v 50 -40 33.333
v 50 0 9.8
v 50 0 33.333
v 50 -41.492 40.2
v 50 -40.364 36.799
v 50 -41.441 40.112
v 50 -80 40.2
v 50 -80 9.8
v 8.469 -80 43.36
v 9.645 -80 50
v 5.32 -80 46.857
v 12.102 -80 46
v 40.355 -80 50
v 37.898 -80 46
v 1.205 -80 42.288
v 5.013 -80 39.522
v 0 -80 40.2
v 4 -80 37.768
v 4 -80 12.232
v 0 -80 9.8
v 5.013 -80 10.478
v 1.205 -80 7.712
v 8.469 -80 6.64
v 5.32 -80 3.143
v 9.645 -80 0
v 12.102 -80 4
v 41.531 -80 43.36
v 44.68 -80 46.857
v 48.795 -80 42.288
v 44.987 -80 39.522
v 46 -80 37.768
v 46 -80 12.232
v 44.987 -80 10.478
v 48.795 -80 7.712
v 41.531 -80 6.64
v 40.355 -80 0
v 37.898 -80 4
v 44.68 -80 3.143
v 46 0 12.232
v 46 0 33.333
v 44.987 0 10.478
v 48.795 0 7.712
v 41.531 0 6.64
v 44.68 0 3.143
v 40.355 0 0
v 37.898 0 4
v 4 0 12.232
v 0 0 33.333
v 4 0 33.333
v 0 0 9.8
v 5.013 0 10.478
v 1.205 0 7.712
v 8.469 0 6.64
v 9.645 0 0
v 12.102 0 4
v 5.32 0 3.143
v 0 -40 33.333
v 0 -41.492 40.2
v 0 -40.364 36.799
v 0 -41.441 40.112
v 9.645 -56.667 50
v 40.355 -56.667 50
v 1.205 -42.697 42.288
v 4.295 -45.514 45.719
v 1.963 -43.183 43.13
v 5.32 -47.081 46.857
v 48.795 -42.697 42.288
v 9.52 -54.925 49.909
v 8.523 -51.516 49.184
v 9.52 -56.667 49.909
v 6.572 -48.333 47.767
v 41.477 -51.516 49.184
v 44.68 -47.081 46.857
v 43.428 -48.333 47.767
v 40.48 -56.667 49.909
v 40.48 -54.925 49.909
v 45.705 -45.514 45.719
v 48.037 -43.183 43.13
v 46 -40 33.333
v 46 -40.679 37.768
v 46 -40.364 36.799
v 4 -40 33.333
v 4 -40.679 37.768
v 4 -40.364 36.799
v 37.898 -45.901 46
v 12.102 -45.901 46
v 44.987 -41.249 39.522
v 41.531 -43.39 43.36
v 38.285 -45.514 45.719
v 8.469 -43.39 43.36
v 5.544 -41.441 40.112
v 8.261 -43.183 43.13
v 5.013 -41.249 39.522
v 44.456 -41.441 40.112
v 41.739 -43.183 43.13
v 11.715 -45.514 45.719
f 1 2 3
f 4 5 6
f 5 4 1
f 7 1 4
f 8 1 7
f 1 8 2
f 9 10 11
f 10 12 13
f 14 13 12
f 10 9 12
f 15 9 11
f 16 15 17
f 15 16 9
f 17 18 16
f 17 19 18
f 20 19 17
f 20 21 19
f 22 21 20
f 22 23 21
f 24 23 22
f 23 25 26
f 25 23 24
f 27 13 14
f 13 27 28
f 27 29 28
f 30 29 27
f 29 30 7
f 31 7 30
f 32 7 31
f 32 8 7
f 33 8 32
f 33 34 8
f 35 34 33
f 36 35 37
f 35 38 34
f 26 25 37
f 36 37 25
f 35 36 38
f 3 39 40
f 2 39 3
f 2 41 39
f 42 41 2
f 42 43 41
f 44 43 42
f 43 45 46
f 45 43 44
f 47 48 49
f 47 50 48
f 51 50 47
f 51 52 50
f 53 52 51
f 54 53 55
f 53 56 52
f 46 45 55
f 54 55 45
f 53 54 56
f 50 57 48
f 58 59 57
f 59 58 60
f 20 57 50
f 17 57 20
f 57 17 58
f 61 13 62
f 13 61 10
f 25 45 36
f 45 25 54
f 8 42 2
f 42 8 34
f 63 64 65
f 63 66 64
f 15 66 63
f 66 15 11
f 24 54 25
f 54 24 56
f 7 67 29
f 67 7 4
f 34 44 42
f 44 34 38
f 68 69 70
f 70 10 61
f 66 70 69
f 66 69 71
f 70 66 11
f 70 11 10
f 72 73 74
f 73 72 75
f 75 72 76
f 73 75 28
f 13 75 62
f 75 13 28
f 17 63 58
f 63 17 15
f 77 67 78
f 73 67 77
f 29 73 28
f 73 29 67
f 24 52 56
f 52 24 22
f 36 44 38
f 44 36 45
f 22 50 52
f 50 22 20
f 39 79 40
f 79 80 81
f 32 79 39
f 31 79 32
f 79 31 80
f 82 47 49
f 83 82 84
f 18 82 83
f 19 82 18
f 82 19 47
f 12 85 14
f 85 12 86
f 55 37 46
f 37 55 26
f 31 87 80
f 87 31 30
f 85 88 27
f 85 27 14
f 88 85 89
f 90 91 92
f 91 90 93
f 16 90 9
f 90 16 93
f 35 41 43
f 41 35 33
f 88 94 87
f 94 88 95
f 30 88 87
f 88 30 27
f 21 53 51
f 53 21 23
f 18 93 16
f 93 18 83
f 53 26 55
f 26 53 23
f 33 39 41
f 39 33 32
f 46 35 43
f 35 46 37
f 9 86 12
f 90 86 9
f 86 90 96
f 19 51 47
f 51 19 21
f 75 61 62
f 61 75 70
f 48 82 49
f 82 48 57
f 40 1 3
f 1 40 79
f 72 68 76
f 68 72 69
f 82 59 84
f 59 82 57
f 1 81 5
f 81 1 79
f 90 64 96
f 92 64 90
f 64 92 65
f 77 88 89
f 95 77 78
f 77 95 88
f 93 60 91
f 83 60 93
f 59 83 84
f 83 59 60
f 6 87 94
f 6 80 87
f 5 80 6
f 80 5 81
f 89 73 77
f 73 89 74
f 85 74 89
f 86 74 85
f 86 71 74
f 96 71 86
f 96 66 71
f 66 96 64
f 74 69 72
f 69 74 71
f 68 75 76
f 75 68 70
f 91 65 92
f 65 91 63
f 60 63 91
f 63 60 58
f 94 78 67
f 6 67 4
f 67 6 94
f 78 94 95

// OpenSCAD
//
//  Copyright (C) 05-11-2012 Jasper den Ouden.
//
//  This is free software: you can redistribute it and/or modify
//  it under the terms of the GNU General Public License as published
//  by the Free Software Foundation, either version 3 of the License, or
//  (at your option) any later version.
//

module meh(r,w,h)
{ intersection()
    {
        cube([w,w,h]);
        translate([w/2,w/2]) cylinder(r=r,h=h);
    }
}

w = 50;
Rf = 1.7;
R = w/Rf;
h = 80;

plate_w = 4;

drop = w/3;
hinge_y = h/2;

module body()
{ wi = w-2*plate_w;
  Ri = wi/Rf;
  difference()
  { meh(R,w,h);
    translate([plate_w,plate_w,-h]) meh(Ri,wi,3*h);
    /*  translate([plate_w,plate_w,-h]) intersection()
      { meh(Ri,wi,3*h);
          union()
          { cube([w,w,h+hinge_y]);
            cube([w,w-drop,3*h]);
//            translate([0,w-drop-plate_w,h+hinge_y])
//                  rotate(v=[0,1,0], a=90) cylinder(r=drop-plate_w, h=w);
          }
          }*/
  }
}
//rotate(v=[1,0,0],a=90) body();

rotate(v=[1,0,0],a=90)
difference() 
{ body();
  translate([-w,w-drop,-h+drop]) 
  difference()
  { cube([3*w,3*w,h+hinge_y]);
    translate([0,0,h+hinge_y]) 
        rotate(a=90,v=[0,1,0]) 
        cylinder(r=drop, h=3*w);
  }
}
